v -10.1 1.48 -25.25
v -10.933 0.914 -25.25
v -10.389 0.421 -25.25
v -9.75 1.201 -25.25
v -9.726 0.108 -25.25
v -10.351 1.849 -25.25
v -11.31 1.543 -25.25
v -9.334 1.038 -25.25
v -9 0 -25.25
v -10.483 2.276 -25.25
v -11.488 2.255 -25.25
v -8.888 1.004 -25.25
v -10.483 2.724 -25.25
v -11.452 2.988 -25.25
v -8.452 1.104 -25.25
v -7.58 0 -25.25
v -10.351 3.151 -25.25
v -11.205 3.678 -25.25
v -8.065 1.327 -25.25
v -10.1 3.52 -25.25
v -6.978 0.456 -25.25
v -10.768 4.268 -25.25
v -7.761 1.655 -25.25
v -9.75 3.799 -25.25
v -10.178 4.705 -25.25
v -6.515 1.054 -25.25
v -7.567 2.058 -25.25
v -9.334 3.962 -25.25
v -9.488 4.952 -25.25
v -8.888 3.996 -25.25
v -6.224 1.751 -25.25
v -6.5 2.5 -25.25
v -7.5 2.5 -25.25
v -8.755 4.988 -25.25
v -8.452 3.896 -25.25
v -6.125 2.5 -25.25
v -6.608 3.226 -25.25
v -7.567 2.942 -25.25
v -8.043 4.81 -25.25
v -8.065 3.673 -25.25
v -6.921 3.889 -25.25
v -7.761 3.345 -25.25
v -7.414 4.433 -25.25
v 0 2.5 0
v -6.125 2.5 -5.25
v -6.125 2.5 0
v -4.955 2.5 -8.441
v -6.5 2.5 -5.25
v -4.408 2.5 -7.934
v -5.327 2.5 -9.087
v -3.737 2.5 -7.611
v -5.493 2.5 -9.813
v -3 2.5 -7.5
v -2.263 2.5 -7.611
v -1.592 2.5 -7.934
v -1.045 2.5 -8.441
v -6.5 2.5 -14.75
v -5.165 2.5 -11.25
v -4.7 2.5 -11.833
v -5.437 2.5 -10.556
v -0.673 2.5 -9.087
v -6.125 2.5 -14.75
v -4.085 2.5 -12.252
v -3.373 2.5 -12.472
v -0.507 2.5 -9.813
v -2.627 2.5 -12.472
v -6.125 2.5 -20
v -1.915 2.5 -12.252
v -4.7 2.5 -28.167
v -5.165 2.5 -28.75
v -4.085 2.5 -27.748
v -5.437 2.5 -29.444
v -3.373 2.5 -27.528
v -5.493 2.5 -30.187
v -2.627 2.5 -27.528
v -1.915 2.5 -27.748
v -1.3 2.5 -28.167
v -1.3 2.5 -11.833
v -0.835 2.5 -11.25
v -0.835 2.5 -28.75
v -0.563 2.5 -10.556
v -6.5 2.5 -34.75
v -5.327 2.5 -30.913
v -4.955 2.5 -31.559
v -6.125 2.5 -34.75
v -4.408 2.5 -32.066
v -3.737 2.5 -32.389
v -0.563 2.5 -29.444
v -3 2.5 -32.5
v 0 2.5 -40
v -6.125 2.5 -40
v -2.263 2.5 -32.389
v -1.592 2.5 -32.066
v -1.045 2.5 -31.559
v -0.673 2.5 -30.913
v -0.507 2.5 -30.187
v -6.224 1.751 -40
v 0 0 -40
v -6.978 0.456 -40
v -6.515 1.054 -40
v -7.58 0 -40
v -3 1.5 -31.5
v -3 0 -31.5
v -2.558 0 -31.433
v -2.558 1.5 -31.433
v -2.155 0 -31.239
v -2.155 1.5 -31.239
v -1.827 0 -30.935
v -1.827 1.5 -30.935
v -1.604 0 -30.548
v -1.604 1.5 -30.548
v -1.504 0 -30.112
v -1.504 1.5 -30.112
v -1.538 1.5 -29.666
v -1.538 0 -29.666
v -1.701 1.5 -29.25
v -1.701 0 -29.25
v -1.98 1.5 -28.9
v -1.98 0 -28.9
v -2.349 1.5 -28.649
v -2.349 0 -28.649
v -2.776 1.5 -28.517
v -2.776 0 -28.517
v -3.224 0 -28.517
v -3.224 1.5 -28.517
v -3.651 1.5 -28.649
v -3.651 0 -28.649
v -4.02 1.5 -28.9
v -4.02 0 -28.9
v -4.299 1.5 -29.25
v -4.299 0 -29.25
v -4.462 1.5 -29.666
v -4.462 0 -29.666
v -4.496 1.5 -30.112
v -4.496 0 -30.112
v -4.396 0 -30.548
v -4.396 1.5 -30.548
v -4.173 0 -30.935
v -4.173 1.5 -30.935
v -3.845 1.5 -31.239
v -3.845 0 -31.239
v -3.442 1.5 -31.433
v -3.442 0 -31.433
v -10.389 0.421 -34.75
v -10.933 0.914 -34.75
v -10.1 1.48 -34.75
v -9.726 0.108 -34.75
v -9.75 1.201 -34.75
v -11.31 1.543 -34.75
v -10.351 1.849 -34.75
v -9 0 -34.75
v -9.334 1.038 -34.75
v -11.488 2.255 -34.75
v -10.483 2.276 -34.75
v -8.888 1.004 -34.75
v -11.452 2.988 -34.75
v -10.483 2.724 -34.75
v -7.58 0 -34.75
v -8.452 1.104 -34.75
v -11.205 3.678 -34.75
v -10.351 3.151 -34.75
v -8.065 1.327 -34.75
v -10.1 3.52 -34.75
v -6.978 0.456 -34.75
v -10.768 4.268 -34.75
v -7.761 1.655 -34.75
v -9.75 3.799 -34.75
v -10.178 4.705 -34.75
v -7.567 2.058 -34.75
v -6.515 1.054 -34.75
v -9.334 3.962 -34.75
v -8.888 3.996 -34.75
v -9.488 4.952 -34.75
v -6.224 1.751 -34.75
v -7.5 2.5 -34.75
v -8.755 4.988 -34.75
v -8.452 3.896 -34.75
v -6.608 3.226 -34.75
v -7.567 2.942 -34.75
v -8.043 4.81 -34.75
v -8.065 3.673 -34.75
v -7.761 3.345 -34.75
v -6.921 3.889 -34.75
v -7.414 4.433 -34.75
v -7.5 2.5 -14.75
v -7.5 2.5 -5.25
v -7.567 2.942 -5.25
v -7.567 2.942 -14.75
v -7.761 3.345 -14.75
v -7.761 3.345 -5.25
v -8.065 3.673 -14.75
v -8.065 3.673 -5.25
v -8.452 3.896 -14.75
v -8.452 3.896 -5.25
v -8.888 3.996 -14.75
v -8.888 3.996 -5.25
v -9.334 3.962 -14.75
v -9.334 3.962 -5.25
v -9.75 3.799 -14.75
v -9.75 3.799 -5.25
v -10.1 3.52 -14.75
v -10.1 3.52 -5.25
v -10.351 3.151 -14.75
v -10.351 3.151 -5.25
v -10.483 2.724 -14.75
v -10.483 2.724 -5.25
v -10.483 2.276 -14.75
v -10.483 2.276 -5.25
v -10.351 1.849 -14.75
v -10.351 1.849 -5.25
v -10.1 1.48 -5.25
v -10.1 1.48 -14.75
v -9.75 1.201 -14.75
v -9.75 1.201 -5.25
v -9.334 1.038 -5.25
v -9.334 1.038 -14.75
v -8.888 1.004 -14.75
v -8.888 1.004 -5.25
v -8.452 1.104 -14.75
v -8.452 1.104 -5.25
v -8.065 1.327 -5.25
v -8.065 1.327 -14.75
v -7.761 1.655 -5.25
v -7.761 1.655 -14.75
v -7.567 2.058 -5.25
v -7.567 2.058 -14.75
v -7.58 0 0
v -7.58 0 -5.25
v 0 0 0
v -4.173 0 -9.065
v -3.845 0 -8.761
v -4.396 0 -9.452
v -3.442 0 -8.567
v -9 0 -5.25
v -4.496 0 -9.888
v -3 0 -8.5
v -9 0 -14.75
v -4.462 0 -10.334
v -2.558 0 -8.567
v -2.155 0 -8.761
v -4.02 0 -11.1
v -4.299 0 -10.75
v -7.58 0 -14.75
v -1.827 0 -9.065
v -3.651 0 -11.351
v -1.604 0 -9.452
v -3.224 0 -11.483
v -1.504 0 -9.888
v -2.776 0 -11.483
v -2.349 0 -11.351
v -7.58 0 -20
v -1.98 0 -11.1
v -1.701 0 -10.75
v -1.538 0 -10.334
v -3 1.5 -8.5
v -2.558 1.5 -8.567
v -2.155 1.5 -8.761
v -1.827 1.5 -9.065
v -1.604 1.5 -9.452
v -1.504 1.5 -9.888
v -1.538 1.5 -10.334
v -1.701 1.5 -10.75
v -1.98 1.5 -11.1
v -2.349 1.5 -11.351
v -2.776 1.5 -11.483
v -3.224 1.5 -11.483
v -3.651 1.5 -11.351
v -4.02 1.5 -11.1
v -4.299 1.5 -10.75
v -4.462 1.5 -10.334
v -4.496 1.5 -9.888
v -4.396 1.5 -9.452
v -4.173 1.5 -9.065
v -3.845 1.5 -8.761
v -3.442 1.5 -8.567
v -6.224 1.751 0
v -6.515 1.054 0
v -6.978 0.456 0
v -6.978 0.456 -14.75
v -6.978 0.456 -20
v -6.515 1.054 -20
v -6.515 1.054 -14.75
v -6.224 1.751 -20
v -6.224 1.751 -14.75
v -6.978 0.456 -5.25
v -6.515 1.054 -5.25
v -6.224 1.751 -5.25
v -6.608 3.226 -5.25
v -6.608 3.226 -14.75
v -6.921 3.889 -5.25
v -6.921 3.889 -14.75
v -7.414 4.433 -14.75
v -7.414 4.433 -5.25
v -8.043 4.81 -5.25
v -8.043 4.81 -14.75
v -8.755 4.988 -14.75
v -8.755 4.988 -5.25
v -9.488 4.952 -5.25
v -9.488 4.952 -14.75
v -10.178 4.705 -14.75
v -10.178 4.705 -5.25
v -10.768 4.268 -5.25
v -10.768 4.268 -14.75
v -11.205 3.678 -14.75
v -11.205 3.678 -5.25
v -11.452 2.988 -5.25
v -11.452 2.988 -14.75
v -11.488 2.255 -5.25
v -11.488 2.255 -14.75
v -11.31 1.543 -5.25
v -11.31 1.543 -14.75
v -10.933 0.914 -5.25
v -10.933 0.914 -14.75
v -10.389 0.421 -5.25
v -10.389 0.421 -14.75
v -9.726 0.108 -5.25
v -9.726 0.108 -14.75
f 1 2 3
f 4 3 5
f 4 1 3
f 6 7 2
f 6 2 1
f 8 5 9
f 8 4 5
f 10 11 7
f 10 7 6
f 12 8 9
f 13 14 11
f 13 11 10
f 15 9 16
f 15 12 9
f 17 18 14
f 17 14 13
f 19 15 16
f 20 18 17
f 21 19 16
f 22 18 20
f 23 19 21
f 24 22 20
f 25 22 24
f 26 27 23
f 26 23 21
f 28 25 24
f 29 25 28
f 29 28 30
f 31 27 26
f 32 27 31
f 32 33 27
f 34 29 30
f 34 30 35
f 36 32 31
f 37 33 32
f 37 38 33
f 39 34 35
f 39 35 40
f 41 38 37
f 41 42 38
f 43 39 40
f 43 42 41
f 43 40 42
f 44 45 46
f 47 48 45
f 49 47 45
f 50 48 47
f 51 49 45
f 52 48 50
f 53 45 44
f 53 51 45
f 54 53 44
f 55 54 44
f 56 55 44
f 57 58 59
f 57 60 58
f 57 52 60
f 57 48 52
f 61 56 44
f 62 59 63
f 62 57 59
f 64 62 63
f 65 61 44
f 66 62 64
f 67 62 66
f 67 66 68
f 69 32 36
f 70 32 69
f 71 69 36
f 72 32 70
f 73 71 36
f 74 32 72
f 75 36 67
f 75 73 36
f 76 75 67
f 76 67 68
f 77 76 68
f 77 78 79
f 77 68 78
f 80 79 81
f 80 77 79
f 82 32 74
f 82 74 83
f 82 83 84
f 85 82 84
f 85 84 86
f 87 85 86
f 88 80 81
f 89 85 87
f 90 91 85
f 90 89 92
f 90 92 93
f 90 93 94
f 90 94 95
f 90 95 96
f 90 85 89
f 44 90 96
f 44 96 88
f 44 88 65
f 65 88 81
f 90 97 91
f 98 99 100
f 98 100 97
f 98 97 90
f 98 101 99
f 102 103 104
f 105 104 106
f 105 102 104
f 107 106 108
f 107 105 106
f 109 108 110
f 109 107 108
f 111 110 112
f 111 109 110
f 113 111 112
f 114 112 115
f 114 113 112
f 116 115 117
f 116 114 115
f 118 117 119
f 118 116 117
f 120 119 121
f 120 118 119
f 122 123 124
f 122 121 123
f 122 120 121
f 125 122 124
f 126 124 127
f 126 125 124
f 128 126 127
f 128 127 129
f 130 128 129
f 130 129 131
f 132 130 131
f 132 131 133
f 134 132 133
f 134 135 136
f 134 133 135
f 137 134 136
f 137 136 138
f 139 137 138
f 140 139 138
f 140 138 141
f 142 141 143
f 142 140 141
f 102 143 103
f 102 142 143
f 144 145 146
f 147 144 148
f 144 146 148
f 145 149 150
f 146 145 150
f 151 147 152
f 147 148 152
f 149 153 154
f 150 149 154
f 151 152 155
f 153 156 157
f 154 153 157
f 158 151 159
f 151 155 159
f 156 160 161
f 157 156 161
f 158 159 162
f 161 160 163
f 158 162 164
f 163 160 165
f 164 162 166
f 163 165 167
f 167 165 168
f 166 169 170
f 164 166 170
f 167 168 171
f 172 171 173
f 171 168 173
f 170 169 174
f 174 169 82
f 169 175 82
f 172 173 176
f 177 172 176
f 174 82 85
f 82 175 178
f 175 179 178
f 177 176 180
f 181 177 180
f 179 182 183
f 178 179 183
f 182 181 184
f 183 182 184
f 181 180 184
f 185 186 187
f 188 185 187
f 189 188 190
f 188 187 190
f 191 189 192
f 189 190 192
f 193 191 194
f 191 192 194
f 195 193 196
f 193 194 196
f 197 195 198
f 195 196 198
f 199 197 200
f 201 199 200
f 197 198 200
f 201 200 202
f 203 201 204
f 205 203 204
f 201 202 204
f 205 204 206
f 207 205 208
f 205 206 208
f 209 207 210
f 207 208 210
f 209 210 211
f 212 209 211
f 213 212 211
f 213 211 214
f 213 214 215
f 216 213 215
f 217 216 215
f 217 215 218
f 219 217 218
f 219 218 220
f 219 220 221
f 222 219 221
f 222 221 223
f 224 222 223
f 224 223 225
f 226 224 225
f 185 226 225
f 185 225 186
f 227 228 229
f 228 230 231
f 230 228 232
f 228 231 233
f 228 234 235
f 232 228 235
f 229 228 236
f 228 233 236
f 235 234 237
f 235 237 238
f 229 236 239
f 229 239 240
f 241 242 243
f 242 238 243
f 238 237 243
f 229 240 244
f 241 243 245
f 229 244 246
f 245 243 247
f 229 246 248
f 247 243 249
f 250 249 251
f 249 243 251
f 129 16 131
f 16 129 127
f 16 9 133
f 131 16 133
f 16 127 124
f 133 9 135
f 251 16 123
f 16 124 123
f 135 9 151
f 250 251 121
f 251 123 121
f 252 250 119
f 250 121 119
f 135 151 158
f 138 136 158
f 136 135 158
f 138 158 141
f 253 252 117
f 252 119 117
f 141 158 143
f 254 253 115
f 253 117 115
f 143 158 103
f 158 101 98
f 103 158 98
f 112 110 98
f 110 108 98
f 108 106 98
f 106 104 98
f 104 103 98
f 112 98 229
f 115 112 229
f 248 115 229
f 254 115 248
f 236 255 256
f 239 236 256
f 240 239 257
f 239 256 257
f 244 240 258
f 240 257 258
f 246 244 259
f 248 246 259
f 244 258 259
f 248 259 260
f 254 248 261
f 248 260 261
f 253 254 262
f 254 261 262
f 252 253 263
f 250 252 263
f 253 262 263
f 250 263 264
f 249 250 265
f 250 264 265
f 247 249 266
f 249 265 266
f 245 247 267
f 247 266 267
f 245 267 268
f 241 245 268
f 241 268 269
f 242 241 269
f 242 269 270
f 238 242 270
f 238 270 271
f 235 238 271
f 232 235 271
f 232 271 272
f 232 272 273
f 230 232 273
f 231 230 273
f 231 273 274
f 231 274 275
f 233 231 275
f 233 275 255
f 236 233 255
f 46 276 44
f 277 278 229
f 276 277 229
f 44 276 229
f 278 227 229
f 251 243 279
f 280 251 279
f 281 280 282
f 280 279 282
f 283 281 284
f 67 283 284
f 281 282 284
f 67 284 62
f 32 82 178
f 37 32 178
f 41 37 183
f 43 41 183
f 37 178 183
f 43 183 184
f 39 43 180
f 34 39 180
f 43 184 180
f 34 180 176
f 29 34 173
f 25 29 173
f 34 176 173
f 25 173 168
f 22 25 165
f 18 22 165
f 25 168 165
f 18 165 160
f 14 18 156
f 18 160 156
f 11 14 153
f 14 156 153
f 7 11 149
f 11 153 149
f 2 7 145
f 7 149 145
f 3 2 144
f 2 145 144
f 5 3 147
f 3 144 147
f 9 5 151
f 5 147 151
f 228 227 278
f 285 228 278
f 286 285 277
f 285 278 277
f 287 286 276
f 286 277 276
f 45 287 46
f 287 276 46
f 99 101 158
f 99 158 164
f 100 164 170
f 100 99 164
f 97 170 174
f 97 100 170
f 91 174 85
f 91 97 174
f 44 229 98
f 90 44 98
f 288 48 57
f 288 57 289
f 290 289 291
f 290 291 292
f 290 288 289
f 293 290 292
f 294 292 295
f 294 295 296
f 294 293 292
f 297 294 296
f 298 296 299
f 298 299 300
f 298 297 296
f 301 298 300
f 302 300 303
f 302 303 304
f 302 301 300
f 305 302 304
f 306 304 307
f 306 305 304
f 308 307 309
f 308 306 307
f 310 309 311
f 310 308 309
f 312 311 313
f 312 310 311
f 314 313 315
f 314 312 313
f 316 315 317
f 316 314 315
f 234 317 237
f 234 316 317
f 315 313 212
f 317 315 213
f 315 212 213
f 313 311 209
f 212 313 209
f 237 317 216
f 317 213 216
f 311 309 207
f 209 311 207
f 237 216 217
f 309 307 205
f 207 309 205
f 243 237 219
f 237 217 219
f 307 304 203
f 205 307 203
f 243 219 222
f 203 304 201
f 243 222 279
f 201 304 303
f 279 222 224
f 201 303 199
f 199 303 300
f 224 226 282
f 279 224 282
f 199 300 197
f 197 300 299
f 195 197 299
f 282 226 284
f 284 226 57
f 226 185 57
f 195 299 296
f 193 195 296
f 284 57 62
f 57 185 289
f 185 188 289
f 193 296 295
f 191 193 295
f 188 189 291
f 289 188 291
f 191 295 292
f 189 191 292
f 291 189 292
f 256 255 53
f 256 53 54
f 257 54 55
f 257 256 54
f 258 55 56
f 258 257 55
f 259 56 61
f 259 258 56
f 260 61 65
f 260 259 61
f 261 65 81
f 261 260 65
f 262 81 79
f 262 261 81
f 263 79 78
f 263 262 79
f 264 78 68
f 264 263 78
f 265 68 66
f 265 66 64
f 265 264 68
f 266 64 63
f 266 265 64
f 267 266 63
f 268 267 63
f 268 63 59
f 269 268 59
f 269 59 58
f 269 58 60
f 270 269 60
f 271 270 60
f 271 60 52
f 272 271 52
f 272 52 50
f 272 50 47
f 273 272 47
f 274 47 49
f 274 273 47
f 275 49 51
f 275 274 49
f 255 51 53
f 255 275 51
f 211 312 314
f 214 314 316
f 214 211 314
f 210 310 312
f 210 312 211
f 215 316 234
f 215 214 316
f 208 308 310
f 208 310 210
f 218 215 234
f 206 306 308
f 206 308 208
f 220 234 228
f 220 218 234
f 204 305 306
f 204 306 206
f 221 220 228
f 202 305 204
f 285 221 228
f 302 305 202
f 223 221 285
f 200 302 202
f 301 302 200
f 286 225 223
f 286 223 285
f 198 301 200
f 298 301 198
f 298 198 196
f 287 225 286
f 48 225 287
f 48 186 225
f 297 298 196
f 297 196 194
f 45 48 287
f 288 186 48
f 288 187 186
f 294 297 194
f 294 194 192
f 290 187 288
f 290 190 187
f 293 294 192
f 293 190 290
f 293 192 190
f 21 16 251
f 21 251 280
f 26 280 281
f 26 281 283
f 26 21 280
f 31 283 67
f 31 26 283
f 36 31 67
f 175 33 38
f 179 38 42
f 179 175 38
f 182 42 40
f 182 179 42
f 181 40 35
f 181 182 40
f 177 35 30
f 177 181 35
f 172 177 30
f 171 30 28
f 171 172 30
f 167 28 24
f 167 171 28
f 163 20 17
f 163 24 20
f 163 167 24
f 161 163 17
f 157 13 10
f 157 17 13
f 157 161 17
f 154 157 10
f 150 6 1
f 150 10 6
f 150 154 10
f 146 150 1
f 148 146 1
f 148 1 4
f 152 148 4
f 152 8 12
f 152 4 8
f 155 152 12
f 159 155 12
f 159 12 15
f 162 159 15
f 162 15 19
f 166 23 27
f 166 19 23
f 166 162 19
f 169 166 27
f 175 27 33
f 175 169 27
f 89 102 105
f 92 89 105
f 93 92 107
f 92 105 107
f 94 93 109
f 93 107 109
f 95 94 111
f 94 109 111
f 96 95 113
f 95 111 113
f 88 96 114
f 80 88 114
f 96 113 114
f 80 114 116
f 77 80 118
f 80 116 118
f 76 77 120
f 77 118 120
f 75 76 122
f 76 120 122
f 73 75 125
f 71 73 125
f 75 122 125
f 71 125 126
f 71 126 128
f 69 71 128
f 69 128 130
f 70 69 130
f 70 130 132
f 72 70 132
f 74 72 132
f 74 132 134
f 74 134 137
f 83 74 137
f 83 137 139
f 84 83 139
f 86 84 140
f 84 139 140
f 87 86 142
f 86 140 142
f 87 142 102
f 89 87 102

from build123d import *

# Parameters (mm, degrees)
SKETCH1_W           = 9
SKETCH1_H           = 40
BOSS_EXTRUDE1_DEPTH = 2.5
BOSS_EXTRUDE2_START = -5.25
SKETCH2_R           = 2.5
BOSS_EXTRUDE2_DEPTH = 9.5
SKETCH3_R           = 1.5
CUT_EXTRUDE1_DEPTH  = 42.919565837
SKETCH4_R           = 2.875
CUT_EXTRUDE2_DEPTH  = 5.25
CUT_EXTRUDE3_START  = -14.75
SKETCH4_2_R         = 2.875
CUT_EXTRUDE3_DEPTH  = 5.25
SKETCH5_R           = 1.5
CUT_EXTRUDE4_DEPTH  = 42.695323479
CHAMFER1_SIZE       = 1
CHAMFER2_SIZE       = 1


with BuildPart() as part:
    # Sketch1 → Boss-Extrude1 (new body)
    with BuildSketch(Plane(origin=(0, 0, 0), x_dir=(1, 0, 0), z_dir=(0, 1, 0))):
        with Locations((-4.5, 20)):
            Rectangle(SKETCH1_W, SKETCH1_H)
    extrude(amount=BOSS_EXTRUDE1_DEPTH)

    # Sketch2 → Boss-Extrude2 (add)
    with BuildSketch(Plane.XY.offset(BOSS_EXTRUDE2_START)):
        with Locations((-9, 2.5)):
            Circle(SKETCH2_R)
    boss_extrude2 = extrude(amount=-BOSS_EXTRUDE2_DEPTH)

    # Sketch3 → Cut-Extrude1 (cut, through all)
    with BuildSketch(Plane.XY):
        with Locations((-9, 2.5)):
            Circle(SKETCH3_R)
    cut_extrude1 = extrude(amount=-CUT_EXTRUDE1_DEPTH, mode=Mode.SUBTRACT)

    # Sketch4 → Cut-Extrude2 (cut)
    with BuildSketch(Plane.XY):
        with Locations((-9, 2.5)):
            Circle(SKETCH4_R)
    cut_extrude2 = extrude(amount=-CUT_EXTRUDE2_DEPTH, mode=Mode.SUBTRACT)

    # Sketch4<2> → Cut-Extrude3 (cut)
    with BuildSketch(Plane.XY.offset(CUT_EXTRUDE3_START)):
        with Locations((-9, 2.5)):
            Circle(SKETCH4_2_R)
    cut_extrude3 = extrude(amount=-CUT_EXTRUDE3_DEPTH, mode=Mode.SUBTRACT)

    # Mirror2: Boss-Extrude2, Cut-Extrude1, Cut-Extrude2, Cut-Extrude3 across plane
    add(boss_extrude2.mirror(Plane.XY.offset(-20)))
    add(cut_extrude1.mirror(Plane.XY.offset(-20)), mode=Mode.SUBTRACT)
    add(cut_extrude2.mirror(Plane.XY.offset(-20)), mode=Mode.SUBTRACT)
    add(cut_extrude3.mirror(Plane.XY.offset(-20)), mode=Mode.SUBTRACT)

    # Sketch5 → Cut-Extrude4 (cut, through all)
    with BuildSketch(Plane(origin=(0, 2.5, 0), x_dir=(1, 0, 0), z_dir=(0, 1, 0))):
        with Locations(Location((-3, 10, 0), (0, 0, 270))):
            Circle(SKETCH5_R)
    cut_extrude4 = extrude(amount=-CUT_EXTRUDE4_DEPTH, mode=Mode.SUBTRACT)

    # Mirror3: Cut-Extrude4 across plane
    add(cut_extrude4.mirror(Plane.XY.offset(-20)), mode=Mode.SUBTRACT)

    # Chamfer1
    chamfer1_edges = [part.edges().sort_by_distance(p)[0] for p in [
        (-3, 2.5, -28.5),
    ]]
    chamfer(chamfer1_edges, length=CHAMFER1_SIZE)

    # Chamfer2
    chamfer2_edges = [part.edges().sort_by_distance(p)[0] for p in [
        (-3, 2.5, -11.5),
    ]]
    chamfer(chamfer2_edges, length=CHAMFER2_SIZE)


solid = part.part
